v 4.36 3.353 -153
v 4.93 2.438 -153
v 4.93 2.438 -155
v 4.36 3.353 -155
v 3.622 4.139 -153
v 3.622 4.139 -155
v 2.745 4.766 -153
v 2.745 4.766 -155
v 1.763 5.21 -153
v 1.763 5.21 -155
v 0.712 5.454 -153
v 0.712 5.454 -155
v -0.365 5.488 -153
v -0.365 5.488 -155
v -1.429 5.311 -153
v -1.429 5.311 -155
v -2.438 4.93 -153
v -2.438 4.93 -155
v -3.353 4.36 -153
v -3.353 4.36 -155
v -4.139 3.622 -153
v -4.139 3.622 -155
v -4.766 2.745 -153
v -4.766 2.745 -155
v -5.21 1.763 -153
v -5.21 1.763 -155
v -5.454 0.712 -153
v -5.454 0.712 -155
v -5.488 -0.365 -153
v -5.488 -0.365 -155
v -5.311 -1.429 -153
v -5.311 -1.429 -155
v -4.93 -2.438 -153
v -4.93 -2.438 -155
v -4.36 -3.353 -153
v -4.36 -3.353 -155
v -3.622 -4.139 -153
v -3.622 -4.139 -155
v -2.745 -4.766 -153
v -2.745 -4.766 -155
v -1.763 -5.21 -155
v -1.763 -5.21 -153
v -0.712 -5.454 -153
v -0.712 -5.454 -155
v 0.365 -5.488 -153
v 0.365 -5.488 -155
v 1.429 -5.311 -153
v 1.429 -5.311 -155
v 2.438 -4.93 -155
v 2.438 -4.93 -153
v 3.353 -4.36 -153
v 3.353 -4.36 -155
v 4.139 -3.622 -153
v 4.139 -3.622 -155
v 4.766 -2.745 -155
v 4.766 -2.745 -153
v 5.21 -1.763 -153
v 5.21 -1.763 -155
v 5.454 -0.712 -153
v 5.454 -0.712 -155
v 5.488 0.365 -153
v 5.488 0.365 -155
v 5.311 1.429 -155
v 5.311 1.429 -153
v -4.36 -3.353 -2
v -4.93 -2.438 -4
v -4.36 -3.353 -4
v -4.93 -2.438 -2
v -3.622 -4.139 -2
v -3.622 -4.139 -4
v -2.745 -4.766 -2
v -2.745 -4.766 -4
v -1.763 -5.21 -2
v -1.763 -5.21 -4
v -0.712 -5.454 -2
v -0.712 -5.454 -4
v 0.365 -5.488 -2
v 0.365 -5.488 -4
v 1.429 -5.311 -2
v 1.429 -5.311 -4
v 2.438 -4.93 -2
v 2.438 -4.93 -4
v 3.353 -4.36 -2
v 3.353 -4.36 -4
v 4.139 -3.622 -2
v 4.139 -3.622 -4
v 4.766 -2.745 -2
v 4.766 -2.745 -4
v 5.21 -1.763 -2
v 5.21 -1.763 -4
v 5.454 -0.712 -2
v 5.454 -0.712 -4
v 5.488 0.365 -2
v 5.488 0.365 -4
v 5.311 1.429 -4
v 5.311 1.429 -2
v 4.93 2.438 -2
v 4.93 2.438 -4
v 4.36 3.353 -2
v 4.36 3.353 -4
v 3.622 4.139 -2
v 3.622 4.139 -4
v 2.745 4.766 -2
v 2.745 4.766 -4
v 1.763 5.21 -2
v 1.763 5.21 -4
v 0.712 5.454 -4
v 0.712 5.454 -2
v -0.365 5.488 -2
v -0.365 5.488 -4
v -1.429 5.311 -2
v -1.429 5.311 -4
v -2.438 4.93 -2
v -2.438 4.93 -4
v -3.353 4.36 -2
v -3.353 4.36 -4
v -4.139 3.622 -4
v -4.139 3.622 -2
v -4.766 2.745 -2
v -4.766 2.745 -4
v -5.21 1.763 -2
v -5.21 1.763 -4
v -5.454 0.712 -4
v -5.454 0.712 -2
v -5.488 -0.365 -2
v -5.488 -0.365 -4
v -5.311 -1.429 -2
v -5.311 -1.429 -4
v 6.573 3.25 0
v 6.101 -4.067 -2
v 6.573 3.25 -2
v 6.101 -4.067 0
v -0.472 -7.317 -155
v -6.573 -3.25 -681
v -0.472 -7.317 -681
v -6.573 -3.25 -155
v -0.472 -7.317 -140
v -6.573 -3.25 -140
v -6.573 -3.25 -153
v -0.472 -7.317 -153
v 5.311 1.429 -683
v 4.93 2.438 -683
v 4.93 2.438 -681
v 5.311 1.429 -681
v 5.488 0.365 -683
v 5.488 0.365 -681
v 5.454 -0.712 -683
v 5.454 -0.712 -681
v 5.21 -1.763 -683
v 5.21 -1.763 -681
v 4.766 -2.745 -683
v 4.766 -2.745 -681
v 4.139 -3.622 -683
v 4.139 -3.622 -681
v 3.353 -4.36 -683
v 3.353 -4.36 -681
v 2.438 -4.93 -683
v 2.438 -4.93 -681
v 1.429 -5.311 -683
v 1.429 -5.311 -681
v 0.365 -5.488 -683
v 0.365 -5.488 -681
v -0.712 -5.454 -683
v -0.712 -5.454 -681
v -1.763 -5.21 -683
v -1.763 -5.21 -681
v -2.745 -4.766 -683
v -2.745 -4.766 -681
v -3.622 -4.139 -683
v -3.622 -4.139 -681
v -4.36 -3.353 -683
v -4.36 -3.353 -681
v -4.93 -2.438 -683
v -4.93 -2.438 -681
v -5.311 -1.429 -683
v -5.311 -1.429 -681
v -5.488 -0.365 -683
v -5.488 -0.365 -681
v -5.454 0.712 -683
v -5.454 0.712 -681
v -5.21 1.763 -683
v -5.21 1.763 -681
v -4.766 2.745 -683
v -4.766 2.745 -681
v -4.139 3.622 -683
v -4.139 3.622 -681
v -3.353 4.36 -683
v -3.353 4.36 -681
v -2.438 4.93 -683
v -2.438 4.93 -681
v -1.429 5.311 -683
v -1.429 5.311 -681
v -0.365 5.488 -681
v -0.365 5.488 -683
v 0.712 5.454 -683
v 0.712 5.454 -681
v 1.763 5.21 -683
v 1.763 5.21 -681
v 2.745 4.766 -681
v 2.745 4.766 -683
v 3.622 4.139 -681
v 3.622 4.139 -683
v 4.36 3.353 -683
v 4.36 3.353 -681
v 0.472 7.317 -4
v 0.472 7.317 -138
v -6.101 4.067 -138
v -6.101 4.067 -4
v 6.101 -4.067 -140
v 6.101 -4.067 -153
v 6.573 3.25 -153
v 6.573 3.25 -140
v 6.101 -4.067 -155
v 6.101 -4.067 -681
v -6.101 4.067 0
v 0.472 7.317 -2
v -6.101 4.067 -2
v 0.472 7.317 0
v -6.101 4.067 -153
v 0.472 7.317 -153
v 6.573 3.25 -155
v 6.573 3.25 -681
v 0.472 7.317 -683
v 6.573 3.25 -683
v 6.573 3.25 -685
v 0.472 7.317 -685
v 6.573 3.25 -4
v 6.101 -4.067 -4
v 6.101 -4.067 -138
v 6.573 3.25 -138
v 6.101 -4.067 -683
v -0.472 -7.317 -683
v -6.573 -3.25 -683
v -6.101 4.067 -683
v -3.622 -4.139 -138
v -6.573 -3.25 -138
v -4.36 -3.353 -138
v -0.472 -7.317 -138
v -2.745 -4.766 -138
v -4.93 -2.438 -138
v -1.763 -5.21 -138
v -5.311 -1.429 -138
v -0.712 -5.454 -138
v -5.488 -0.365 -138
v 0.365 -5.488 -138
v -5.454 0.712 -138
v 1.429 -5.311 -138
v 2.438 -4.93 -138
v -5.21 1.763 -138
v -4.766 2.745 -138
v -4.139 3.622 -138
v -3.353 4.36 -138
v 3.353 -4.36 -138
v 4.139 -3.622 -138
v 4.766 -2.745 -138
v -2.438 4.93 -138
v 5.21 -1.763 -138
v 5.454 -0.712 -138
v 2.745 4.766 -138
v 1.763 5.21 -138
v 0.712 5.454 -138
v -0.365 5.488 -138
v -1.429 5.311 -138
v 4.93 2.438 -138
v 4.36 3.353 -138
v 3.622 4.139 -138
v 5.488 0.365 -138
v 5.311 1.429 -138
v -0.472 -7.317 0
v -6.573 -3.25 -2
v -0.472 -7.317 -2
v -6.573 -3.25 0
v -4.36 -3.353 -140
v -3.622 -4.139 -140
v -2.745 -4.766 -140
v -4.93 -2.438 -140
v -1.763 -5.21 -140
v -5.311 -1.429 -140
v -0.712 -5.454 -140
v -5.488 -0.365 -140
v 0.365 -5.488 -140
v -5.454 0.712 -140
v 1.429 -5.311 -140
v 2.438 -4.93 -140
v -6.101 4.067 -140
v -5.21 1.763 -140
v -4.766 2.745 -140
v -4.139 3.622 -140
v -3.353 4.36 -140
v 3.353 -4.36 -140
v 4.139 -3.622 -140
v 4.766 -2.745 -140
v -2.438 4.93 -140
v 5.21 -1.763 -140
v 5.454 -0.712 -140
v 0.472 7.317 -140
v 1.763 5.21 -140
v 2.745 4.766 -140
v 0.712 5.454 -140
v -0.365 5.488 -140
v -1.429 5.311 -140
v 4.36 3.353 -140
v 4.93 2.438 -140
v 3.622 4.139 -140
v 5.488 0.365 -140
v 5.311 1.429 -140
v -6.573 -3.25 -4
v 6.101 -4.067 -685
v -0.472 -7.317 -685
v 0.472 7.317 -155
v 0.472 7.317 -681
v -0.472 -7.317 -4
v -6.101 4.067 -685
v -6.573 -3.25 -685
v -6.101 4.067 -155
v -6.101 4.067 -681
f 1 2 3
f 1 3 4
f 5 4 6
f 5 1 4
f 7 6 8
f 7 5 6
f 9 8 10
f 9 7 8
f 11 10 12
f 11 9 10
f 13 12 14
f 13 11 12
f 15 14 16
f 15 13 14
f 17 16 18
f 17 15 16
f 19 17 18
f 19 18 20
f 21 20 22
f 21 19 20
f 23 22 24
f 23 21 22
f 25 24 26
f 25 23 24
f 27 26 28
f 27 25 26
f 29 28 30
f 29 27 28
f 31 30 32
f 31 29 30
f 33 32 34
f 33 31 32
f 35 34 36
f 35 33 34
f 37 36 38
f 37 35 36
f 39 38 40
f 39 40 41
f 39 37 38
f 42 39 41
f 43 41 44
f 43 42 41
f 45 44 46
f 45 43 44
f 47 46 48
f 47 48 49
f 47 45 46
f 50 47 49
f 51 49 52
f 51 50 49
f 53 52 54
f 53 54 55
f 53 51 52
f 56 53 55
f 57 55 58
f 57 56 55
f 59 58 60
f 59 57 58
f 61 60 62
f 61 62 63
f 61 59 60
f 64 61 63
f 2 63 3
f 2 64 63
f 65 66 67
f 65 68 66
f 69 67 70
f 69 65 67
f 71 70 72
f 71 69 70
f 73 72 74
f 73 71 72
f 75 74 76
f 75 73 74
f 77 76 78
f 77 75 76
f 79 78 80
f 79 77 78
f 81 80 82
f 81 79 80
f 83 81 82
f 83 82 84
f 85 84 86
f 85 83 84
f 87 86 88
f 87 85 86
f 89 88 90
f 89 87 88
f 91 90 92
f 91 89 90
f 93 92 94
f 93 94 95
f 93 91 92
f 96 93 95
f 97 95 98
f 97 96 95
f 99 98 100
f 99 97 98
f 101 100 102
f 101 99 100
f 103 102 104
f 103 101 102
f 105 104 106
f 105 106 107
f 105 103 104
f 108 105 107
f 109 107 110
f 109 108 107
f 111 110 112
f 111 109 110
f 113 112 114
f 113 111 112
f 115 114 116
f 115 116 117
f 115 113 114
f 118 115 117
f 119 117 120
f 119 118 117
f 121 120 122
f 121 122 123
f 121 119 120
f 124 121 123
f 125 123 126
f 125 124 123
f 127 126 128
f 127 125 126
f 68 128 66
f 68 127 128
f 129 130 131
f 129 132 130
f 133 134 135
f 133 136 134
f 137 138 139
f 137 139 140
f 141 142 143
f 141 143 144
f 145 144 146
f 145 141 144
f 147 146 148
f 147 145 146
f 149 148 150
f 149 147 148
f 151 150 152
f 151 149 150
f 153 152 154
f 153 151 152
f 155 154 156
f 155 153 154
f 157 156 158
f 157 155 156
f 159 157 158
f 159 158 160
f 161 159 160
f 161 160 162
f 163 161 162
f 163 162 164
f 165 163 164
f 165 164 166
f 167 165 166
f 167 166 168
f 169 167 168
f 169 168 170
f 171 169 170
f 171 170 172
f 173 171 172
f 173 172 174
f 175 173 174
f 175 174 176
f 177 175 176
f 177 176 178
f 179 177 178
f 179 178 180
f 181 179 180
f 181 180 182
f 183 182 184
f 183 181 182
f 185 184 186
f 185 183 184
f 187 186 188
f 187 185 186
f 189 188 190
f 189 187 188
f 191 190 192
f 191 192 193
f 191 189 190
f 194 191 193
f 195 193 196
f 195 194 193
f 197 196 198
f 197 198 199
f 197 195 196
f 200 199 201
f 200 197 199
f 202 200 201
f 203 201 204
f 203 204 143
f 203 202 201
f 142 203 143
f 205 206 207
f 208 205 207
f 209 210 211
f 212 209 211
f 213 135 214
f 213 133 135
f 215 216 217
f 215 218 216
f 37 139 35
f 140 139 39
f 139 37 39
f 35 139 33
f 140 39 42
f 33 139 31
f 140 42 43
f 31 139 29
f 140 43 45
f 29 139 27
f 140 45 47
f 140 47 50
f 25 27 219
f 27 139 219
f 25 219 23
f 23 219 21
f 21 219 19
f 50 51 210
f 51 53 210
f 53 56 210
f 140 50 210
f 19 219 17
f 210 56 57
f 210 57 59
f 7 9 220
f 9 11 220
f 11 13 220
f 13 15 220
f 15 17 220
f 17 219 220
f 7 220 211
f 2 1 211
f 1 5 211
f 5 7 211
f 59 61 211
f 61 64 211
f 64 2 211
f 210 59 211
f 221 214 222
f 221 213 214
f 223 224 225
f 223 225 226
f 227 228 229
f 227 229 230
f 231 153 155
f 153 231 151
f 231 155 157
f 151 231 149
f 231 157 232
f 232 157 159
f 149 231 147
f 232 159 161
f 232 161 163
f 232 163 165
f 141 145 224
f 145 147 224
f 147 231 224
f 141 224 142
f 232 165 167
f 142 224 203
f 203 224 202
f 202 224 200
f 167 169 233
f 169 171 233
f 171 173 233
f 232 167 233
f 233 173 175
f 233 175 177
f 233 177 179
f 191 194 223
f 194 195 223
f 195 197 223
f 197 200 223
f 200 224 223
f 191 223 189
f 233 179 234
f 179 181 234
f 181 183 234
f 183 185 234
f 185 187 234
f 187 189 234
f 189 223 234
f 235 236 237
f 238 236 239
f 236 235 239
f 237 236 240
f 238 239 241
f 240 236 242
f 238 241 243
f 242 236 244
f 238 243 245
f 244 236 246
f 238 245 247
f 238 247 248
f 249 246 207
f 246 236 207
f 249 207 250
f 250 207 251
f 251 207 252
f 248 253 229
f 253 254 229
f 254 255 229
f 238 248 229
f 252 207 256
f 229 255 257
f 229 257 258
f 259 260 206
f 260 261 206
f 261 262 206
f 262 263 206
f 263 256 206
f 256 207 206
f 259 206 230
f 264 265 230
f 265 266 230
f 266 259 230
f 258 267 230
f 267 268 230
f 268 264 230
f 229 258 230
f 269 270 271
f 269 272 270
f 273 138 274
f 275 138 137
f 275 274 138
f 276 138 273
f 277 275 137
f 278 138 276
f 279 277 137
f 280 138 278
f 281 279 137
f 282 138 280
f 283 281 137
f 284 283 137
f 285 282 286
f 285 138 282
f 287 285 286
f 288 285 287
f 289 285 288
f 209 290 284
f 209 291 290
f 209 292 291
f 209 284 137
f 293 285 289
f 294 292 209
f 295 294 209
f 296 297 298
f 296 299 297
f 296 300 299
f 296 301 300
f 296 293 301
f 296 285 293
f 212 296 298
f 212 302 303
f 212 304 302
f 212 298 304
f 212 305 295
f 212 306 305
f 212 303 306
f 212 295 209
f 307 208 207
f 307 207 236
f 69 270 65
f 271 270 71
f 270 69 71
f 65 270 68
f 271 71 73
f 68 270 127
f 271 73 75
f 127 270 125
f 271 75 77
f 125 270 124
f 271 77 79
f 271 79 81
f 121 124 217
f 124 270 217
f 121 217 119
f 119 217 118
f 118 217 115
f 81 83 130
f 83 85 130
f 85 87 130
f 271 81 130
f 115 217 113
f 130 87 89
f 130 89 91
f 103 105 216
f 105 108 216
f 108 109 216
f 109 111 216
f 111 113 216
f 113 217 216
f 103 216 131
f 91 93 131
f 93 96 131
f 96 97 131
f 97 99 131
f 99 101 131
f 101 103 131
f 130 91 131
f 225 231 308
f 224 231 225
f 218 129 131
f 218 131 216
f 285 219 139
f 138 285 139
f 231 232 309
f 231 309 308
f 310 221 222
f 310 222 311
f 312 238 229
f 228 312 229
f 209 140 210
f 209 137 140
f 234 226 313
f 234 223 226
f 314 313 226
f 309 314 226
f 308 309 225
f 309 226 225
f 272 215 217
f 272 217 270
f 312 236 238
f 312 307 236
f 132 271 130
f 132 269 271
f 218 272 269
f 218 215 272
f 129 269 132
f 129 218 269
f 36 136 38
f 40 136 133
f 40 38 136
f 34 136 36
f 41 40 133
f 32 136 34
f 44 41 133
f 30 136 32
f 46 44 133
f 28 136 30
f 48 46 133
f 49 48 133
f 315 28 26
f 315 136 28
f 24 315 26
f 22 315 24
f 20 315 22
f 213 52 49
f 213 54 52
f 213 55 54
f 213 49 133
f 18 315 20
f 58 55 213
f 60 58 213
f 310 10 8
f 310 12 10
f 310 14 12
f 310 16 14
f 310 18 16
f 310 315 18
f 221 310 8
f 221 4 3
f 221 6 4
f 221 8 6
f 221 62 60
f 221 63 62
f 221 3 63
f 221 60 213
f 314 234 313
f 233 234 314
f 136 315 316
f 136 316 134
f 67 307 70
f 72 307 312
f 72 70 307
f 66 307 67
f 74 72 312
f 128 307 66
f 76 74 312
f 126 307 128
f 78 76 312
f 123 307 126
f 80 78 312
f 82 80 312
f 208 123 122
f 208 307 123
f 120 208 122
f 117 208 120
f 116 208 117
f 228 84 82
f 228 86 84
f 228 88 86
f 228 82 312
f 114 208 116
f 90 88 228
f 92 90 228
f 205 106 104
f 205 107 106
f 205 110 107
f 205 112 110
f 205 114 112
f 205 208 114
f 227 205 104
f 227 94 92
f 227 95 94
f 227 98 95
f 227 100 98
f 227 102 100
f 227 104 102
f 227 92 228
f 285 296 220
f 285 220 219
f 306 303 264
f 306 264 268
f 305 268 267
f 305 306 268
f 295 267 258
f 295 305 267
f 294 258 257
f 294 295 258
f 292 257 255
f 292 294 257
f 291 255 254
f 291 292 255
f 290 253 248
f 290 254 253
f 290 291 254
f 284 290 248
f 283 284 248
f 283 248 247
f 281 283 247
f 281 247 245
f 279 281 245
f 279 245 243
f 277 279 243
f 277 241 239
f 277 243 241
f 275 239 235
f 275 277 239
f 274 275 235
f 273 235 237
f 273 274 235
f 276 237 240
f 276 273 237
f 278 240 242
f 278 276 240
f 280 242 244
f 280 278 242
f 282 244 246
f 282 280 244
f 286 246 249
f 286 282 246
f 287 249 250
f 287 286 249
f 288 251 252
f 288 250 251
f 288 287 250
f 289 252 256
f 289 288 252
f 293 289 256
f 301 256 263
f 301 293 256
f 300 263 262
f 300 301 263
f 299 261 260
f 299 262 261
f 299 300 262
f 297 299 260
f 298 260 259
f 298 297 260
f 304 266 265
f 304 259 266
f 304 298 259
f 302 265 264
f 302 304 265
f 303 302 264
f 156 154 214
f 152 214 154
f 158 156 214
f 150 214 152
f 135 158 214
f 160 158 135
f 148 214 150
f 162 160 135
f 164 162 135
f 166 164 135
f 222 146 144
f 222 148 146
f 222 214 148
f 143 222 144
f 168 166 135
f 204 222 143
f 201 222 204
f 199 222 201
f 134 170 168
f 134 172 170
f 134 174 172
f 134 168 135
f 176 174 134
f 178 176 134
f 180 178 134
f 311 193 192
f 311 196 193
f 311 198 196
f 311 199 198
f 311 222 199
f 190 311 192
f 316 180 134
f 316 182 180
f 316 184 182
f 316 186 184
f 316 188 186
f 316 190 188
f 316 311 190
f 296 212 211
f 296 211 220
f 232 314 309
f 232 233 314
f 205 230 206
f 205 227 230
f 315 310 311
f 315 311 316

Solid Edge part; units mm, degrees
sketch "Sketch1" plane through (0, 0, 0) normal (0, 0, 1) x (1, 0, 0)
  line L0 (-6.1009, 4.0673) -> (-6.5728, -3.2499)
  line L1 (-6.5728, -3.2499) -> (-0.4719, -7.3171)
  line L2 (-0.4719, -7.3171) -> (6.1009, -4.0673)
  line L3 (6.1009, -4.0673) -> (6.5728, 3.2499)
  line L4 (6.5728, 3.2499) -> (0.4719, 7.3171)
  line L5 (0.4719, 7.3171) -> (-6.1009, 4.0673)
extrude "Protrusion1" add sketch "Sketch1" against normal blind 685
sketch "Sketch2" plane through (0, 0, -2) normal (0, 0, 1) x (-0.8964, -0.4432, 0)
  circle A0 centre (0, 0) radius 5.5
  circle A1 centre (0, 0) radius 13.1424
extrude "ExtrudedCutout_1" cut sketch "Sketch2" against normal blind 2
sketch "Sketch3" plane through (0, 0, -683) normal (0, 0, -1) x (0.8964, 0.4432, 0)
  circle A0 centre (0, 0) radius 5.5
  circle A1 centre (0, 0) radius 13.1424
extrude "ExtrudedCutout_2" cut sketch "Sketch3" against normal blind 2
sketch "Sketch4" plane through (0, 0, -140) normal (0, 0, 1) x (0.8964, 0.4432, 0)
  circle A0 centre (0, 0) radius 5.5
  circle A1 centre (0, 0) radius 13.1424
extrude "ExtrudedCutout_3" cut sketch "Sketch4" along normal blind 2
sketch "Sketch5" plane through (0, 0, -153) normal (0, 0, 1) x (0.8964, 0.4432, 0)
  circle A0 centre (0, 0) radius 5.5
  circle A1 centre (0, 0) radius 10.4372
extrude "ExtrudedCutout_4" cut sketch "Sketch5" against normal blind 2
properties part number "BumbleB0932"
